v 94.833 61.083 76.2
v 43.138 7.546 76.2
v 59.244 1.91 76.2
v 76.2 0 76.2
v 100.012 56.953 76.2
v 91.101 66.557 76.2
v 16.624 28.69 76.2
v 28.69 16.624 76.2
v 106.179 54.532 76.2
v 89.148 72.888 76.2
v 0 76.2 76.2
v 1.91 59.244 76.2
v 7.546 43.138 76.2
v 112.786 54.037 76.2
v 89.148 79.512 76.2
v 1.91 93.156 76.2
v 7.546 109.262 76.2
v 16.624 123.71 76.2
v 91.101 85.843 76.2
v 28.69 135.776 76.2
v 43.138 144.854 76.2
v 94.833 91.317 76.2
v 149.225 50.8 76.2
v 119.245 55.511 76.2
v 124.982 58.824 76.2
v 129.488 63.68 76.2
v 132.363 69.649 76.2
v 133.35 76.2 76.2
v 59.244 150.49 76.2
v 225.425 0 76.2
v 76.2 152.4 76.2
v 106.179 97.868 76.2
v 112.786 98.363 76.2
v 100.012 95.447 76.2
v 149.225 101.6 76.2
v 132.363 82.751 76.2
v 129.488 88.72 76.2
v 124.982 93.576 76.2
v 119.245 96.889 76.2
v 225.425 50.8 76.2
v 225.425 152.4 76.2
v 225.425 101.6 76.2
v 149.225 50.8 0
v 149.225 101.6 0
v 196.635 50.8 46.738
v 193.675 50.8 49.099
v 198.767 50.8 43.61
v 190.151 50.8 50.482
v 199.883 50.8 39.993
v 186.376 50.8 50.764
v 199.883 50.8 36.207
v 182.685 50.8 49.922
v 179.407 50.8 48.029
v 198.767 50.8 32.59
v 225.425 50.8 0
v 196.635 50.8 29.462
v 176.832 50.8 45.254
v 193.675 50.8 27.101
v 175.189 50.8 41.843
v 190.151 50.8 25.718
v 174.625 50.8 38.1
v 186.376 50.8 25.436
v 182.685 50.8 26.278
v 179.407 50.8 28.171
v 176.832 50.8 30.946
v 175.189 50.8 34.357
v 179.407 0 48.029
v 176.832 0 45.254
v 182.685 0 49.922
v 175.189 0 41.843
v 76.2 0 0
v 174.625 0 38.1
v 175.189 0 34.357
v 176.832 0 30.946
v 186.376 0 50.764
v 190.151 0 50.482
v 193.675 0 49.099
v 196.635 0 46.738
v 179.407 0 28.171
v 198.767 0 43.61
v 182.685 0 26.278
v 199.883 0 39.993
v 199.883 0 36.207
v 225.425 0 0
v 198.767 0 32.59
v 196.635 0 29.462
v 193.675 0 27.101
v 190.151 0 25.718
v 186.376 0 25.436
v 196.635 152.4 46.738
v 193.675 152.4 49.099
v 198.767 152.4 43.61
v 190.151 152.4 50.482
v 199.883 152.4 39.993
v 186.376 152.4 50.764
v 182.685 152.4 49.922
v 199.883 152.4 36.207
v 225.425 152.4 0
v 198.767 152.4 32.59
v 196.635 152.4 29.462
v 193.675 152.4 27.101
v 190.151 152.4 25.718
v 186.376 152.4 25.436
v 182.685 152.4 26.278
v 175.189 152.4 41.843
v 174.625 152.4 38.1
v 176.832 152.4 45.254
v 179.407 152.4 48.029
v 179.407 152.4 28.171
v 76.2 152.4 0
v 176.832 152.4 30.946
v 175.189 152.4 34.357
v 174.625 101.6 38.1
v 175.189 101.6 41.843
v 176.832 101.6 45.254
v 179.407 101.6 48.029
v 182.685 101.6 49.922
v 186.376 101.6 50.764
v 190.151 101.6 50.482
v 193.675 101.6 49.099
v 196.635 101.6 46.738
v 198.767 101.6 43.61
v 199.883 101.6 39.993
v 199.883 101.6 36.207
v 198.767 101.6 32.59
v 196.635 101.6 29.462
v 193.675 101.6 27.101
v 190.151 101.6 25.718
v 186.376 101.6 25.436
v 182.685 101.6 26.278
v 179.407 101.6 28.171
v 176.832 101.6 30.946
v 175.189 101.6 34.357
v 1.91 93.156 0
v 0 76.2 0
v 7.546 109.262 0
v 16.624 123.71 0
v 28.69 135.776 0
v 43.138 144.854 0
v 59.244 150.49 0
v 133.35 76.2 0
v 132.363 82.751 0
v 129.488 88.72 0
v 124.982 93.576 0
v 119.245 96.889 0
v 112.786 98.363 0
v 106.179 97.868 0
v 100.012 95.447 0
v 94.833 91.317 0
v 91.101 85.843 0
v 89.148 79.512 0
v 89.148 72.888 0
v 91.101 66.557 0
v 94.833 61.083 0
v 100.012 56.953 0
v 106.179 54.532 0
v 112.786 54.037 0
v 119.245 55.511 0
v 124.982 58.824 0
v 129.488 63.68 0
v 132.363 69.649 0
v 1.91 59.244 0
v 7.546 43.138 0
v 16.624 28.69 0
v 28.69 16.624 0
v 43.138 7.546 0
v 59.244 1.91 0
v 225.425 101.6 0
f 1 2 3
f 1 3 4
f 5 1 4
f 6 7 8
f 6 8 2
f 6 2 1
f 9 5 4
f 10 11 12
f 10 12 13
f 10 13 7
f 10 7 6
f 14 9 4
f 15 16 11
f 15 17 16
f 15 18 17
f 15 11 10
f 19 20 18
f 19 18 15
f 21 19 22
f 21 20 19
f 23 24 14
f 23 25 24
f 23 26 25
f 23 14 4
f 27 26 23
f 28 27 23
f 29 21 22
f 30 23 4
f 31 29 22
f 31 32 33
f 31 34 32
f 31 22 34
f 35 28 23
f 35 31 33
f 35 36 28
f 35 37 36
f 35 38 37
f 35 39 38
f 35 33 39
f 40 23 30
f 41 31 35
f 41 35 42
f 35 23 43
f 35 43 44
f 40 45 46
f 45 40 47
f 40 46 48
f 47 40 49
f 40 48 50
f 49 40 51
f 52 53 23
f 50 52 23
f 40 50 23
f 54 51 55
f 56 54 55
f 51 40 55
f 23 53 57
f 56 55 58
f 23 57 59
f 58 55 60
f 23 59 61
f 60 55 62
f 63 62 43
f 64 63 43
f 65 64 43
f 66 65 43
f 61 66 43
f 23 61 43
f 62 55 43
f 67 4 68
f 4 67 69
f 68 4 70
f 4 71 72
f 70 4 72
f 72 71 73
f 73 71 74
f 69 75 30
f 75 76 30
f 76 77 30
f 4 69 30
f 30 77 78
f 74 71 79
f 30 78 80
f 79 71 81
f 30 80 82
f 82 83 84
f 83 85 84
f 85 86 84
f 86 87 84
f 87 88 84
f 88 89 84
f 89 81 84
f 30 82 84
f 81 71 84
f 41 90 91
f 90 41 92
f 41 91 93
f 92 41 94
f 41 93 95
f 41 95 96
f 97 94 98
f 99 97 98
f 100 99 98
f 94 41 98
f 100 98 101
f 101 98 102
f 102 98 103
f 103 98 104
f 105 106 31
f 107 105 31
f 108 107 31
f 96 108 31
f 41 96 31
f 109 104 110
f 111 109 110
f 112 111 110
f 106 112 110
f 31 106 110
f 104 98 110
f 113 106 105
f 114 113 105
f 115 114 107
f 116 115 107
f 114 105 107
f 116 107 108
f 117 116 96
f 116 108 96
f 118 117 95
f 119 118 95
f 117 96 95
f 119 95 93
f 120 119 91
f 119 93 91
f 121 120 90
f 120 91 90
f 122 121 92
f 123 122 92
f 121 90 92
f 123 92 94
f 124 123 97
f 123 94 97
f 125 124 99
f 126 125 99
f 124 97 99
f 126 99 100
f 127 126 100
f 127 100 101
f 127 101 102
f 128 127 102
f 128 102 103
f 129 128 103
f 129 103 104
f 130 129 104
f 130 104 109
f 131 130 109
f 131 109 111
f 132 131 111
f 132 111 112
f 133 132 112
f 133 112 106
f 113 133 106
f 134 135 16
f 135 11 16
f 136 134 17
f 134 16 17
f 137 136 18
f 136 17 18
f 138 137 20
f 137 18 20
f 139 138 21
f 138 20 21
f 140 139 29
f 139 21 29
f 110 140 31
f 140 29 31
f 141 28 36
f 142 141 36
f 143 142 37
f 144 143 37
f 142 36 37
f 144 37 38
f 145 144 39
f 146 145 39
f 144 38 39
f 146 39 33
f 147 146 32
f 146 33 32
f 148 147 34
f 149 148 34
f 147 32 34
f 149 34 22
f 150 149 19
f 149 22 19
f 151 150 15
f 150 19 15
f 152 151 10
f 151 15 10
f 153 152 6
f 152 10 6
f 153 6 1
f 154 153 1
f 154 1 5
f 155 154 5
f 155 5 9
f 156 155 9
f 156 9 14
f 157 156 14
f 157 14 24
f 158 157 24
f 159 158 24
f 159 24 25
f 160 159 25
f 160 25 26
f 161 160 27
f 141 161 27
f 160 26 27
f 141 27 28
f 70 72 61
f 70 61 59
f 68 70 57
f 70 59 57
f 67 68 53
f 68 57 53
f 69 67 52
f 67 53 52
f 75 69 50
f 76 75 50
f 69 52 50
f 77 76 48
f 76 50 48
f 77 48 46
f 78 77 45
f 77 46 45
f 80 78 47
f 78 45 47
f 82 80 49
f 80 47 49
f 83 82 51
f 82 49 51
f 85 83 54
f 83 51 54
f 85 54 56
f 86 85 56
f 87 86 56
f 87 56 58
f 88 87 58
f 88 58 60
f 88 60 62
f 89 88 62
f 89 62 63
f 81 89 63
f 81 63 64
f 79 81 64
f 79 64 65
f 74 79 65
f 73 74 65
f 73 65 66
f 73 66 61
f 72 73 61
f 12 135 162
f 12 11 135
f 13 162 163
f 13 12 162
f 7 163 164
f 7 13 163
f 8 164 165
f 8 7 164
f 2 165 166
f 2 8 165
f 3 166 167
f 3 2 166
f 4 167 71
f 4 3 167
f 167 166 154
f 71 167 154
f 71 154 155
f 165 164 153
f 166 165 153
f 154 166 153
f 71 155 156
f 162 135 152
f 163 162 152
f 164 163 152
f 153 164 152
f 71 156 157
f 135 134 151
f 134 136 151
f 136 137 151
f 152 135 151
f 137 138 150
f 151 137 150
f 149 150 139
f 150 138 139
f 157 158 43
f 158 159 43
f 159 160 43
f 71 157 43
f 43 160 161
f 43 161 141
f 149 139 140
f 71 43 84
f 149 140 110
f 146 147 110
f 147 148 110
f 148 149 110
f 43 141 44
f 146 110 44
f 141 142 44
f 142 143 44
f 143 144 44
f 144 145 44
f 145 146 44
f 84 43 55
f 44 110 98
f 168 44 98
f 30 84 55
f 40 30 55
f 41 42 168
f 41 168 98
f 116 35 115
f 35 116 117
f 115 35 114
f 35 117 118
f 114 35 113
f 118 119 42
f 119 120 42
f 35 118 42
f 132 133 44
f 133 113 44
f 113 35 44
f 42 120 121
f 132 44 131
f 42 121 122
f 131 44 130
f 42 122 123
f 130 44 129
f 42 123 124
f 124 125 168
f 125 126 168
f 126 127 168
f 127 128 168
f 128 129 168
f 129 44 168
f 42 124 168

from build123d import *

# Parameters (mm, degrees)
F1_DEPTH = 76.2
F2_R     = 76.2
F3_R     = 76.19999
F5_R     = 12.7
F6_DEPTH = 152.4
F4_R     = 22.225
F7_DEPTH = 76.2


# Not quite as in the source:
# - a fillet or chamfer is up to 0.001 mm smaller than in the source, because OpenCascade refuses the exact size


with BuildPart() as f1:
    # F0 (on Top) → F1 (new body)
    with BuildSketch(Plane.XY):
        Polygon((0, 152.4), (0, 0), (225.425, 0), (225.425, 50.8), (149.225, 50.8), (149.225, 101.6), (225.425, 101.6), (225.425, 152.4), align=None)
    extrude(amount=F1_DEPTH)

    # F2
    f2_edges = [f1.edges().sort_by_distance(p)[0] for p in [
        (0, 152.4, 38.1),
    ]]
    fillet(f2_edges, radius=F2_R)

    # F3 (radius 76.2 in the source; OpenCascade refuses exactly that, so slightly less here)
    f3_edges = [f1.edges().sort_by_distance(p)[0] for p in [
        (0, 0, 38.1),
    ]]
    fillet(f3_edges, radius=F3_R)

    # F5 (on face) → F6 (cut)
    with BuildSketch(Plane(origin=(0, 152.4, 0), x_dir=(-1, 0, 0), z_dir=(0, 1, 0))):
        with Locations((-187.325, 38.1)):
            Circle(F5_R)
    extrude(amount=-F6_DEPTH, mode=Mode.SUBTRACT)

    # F4 (on face) → F7 (cut)
    with BuildSketch(Plane.XY.offset(76.2)):
        with Locations((111.125, 76.2)):
            Circle(F4_R)
    extrude(amount=-F7_DEPTH, mode=Mode.SUBTRACT)


solid = f1.part
